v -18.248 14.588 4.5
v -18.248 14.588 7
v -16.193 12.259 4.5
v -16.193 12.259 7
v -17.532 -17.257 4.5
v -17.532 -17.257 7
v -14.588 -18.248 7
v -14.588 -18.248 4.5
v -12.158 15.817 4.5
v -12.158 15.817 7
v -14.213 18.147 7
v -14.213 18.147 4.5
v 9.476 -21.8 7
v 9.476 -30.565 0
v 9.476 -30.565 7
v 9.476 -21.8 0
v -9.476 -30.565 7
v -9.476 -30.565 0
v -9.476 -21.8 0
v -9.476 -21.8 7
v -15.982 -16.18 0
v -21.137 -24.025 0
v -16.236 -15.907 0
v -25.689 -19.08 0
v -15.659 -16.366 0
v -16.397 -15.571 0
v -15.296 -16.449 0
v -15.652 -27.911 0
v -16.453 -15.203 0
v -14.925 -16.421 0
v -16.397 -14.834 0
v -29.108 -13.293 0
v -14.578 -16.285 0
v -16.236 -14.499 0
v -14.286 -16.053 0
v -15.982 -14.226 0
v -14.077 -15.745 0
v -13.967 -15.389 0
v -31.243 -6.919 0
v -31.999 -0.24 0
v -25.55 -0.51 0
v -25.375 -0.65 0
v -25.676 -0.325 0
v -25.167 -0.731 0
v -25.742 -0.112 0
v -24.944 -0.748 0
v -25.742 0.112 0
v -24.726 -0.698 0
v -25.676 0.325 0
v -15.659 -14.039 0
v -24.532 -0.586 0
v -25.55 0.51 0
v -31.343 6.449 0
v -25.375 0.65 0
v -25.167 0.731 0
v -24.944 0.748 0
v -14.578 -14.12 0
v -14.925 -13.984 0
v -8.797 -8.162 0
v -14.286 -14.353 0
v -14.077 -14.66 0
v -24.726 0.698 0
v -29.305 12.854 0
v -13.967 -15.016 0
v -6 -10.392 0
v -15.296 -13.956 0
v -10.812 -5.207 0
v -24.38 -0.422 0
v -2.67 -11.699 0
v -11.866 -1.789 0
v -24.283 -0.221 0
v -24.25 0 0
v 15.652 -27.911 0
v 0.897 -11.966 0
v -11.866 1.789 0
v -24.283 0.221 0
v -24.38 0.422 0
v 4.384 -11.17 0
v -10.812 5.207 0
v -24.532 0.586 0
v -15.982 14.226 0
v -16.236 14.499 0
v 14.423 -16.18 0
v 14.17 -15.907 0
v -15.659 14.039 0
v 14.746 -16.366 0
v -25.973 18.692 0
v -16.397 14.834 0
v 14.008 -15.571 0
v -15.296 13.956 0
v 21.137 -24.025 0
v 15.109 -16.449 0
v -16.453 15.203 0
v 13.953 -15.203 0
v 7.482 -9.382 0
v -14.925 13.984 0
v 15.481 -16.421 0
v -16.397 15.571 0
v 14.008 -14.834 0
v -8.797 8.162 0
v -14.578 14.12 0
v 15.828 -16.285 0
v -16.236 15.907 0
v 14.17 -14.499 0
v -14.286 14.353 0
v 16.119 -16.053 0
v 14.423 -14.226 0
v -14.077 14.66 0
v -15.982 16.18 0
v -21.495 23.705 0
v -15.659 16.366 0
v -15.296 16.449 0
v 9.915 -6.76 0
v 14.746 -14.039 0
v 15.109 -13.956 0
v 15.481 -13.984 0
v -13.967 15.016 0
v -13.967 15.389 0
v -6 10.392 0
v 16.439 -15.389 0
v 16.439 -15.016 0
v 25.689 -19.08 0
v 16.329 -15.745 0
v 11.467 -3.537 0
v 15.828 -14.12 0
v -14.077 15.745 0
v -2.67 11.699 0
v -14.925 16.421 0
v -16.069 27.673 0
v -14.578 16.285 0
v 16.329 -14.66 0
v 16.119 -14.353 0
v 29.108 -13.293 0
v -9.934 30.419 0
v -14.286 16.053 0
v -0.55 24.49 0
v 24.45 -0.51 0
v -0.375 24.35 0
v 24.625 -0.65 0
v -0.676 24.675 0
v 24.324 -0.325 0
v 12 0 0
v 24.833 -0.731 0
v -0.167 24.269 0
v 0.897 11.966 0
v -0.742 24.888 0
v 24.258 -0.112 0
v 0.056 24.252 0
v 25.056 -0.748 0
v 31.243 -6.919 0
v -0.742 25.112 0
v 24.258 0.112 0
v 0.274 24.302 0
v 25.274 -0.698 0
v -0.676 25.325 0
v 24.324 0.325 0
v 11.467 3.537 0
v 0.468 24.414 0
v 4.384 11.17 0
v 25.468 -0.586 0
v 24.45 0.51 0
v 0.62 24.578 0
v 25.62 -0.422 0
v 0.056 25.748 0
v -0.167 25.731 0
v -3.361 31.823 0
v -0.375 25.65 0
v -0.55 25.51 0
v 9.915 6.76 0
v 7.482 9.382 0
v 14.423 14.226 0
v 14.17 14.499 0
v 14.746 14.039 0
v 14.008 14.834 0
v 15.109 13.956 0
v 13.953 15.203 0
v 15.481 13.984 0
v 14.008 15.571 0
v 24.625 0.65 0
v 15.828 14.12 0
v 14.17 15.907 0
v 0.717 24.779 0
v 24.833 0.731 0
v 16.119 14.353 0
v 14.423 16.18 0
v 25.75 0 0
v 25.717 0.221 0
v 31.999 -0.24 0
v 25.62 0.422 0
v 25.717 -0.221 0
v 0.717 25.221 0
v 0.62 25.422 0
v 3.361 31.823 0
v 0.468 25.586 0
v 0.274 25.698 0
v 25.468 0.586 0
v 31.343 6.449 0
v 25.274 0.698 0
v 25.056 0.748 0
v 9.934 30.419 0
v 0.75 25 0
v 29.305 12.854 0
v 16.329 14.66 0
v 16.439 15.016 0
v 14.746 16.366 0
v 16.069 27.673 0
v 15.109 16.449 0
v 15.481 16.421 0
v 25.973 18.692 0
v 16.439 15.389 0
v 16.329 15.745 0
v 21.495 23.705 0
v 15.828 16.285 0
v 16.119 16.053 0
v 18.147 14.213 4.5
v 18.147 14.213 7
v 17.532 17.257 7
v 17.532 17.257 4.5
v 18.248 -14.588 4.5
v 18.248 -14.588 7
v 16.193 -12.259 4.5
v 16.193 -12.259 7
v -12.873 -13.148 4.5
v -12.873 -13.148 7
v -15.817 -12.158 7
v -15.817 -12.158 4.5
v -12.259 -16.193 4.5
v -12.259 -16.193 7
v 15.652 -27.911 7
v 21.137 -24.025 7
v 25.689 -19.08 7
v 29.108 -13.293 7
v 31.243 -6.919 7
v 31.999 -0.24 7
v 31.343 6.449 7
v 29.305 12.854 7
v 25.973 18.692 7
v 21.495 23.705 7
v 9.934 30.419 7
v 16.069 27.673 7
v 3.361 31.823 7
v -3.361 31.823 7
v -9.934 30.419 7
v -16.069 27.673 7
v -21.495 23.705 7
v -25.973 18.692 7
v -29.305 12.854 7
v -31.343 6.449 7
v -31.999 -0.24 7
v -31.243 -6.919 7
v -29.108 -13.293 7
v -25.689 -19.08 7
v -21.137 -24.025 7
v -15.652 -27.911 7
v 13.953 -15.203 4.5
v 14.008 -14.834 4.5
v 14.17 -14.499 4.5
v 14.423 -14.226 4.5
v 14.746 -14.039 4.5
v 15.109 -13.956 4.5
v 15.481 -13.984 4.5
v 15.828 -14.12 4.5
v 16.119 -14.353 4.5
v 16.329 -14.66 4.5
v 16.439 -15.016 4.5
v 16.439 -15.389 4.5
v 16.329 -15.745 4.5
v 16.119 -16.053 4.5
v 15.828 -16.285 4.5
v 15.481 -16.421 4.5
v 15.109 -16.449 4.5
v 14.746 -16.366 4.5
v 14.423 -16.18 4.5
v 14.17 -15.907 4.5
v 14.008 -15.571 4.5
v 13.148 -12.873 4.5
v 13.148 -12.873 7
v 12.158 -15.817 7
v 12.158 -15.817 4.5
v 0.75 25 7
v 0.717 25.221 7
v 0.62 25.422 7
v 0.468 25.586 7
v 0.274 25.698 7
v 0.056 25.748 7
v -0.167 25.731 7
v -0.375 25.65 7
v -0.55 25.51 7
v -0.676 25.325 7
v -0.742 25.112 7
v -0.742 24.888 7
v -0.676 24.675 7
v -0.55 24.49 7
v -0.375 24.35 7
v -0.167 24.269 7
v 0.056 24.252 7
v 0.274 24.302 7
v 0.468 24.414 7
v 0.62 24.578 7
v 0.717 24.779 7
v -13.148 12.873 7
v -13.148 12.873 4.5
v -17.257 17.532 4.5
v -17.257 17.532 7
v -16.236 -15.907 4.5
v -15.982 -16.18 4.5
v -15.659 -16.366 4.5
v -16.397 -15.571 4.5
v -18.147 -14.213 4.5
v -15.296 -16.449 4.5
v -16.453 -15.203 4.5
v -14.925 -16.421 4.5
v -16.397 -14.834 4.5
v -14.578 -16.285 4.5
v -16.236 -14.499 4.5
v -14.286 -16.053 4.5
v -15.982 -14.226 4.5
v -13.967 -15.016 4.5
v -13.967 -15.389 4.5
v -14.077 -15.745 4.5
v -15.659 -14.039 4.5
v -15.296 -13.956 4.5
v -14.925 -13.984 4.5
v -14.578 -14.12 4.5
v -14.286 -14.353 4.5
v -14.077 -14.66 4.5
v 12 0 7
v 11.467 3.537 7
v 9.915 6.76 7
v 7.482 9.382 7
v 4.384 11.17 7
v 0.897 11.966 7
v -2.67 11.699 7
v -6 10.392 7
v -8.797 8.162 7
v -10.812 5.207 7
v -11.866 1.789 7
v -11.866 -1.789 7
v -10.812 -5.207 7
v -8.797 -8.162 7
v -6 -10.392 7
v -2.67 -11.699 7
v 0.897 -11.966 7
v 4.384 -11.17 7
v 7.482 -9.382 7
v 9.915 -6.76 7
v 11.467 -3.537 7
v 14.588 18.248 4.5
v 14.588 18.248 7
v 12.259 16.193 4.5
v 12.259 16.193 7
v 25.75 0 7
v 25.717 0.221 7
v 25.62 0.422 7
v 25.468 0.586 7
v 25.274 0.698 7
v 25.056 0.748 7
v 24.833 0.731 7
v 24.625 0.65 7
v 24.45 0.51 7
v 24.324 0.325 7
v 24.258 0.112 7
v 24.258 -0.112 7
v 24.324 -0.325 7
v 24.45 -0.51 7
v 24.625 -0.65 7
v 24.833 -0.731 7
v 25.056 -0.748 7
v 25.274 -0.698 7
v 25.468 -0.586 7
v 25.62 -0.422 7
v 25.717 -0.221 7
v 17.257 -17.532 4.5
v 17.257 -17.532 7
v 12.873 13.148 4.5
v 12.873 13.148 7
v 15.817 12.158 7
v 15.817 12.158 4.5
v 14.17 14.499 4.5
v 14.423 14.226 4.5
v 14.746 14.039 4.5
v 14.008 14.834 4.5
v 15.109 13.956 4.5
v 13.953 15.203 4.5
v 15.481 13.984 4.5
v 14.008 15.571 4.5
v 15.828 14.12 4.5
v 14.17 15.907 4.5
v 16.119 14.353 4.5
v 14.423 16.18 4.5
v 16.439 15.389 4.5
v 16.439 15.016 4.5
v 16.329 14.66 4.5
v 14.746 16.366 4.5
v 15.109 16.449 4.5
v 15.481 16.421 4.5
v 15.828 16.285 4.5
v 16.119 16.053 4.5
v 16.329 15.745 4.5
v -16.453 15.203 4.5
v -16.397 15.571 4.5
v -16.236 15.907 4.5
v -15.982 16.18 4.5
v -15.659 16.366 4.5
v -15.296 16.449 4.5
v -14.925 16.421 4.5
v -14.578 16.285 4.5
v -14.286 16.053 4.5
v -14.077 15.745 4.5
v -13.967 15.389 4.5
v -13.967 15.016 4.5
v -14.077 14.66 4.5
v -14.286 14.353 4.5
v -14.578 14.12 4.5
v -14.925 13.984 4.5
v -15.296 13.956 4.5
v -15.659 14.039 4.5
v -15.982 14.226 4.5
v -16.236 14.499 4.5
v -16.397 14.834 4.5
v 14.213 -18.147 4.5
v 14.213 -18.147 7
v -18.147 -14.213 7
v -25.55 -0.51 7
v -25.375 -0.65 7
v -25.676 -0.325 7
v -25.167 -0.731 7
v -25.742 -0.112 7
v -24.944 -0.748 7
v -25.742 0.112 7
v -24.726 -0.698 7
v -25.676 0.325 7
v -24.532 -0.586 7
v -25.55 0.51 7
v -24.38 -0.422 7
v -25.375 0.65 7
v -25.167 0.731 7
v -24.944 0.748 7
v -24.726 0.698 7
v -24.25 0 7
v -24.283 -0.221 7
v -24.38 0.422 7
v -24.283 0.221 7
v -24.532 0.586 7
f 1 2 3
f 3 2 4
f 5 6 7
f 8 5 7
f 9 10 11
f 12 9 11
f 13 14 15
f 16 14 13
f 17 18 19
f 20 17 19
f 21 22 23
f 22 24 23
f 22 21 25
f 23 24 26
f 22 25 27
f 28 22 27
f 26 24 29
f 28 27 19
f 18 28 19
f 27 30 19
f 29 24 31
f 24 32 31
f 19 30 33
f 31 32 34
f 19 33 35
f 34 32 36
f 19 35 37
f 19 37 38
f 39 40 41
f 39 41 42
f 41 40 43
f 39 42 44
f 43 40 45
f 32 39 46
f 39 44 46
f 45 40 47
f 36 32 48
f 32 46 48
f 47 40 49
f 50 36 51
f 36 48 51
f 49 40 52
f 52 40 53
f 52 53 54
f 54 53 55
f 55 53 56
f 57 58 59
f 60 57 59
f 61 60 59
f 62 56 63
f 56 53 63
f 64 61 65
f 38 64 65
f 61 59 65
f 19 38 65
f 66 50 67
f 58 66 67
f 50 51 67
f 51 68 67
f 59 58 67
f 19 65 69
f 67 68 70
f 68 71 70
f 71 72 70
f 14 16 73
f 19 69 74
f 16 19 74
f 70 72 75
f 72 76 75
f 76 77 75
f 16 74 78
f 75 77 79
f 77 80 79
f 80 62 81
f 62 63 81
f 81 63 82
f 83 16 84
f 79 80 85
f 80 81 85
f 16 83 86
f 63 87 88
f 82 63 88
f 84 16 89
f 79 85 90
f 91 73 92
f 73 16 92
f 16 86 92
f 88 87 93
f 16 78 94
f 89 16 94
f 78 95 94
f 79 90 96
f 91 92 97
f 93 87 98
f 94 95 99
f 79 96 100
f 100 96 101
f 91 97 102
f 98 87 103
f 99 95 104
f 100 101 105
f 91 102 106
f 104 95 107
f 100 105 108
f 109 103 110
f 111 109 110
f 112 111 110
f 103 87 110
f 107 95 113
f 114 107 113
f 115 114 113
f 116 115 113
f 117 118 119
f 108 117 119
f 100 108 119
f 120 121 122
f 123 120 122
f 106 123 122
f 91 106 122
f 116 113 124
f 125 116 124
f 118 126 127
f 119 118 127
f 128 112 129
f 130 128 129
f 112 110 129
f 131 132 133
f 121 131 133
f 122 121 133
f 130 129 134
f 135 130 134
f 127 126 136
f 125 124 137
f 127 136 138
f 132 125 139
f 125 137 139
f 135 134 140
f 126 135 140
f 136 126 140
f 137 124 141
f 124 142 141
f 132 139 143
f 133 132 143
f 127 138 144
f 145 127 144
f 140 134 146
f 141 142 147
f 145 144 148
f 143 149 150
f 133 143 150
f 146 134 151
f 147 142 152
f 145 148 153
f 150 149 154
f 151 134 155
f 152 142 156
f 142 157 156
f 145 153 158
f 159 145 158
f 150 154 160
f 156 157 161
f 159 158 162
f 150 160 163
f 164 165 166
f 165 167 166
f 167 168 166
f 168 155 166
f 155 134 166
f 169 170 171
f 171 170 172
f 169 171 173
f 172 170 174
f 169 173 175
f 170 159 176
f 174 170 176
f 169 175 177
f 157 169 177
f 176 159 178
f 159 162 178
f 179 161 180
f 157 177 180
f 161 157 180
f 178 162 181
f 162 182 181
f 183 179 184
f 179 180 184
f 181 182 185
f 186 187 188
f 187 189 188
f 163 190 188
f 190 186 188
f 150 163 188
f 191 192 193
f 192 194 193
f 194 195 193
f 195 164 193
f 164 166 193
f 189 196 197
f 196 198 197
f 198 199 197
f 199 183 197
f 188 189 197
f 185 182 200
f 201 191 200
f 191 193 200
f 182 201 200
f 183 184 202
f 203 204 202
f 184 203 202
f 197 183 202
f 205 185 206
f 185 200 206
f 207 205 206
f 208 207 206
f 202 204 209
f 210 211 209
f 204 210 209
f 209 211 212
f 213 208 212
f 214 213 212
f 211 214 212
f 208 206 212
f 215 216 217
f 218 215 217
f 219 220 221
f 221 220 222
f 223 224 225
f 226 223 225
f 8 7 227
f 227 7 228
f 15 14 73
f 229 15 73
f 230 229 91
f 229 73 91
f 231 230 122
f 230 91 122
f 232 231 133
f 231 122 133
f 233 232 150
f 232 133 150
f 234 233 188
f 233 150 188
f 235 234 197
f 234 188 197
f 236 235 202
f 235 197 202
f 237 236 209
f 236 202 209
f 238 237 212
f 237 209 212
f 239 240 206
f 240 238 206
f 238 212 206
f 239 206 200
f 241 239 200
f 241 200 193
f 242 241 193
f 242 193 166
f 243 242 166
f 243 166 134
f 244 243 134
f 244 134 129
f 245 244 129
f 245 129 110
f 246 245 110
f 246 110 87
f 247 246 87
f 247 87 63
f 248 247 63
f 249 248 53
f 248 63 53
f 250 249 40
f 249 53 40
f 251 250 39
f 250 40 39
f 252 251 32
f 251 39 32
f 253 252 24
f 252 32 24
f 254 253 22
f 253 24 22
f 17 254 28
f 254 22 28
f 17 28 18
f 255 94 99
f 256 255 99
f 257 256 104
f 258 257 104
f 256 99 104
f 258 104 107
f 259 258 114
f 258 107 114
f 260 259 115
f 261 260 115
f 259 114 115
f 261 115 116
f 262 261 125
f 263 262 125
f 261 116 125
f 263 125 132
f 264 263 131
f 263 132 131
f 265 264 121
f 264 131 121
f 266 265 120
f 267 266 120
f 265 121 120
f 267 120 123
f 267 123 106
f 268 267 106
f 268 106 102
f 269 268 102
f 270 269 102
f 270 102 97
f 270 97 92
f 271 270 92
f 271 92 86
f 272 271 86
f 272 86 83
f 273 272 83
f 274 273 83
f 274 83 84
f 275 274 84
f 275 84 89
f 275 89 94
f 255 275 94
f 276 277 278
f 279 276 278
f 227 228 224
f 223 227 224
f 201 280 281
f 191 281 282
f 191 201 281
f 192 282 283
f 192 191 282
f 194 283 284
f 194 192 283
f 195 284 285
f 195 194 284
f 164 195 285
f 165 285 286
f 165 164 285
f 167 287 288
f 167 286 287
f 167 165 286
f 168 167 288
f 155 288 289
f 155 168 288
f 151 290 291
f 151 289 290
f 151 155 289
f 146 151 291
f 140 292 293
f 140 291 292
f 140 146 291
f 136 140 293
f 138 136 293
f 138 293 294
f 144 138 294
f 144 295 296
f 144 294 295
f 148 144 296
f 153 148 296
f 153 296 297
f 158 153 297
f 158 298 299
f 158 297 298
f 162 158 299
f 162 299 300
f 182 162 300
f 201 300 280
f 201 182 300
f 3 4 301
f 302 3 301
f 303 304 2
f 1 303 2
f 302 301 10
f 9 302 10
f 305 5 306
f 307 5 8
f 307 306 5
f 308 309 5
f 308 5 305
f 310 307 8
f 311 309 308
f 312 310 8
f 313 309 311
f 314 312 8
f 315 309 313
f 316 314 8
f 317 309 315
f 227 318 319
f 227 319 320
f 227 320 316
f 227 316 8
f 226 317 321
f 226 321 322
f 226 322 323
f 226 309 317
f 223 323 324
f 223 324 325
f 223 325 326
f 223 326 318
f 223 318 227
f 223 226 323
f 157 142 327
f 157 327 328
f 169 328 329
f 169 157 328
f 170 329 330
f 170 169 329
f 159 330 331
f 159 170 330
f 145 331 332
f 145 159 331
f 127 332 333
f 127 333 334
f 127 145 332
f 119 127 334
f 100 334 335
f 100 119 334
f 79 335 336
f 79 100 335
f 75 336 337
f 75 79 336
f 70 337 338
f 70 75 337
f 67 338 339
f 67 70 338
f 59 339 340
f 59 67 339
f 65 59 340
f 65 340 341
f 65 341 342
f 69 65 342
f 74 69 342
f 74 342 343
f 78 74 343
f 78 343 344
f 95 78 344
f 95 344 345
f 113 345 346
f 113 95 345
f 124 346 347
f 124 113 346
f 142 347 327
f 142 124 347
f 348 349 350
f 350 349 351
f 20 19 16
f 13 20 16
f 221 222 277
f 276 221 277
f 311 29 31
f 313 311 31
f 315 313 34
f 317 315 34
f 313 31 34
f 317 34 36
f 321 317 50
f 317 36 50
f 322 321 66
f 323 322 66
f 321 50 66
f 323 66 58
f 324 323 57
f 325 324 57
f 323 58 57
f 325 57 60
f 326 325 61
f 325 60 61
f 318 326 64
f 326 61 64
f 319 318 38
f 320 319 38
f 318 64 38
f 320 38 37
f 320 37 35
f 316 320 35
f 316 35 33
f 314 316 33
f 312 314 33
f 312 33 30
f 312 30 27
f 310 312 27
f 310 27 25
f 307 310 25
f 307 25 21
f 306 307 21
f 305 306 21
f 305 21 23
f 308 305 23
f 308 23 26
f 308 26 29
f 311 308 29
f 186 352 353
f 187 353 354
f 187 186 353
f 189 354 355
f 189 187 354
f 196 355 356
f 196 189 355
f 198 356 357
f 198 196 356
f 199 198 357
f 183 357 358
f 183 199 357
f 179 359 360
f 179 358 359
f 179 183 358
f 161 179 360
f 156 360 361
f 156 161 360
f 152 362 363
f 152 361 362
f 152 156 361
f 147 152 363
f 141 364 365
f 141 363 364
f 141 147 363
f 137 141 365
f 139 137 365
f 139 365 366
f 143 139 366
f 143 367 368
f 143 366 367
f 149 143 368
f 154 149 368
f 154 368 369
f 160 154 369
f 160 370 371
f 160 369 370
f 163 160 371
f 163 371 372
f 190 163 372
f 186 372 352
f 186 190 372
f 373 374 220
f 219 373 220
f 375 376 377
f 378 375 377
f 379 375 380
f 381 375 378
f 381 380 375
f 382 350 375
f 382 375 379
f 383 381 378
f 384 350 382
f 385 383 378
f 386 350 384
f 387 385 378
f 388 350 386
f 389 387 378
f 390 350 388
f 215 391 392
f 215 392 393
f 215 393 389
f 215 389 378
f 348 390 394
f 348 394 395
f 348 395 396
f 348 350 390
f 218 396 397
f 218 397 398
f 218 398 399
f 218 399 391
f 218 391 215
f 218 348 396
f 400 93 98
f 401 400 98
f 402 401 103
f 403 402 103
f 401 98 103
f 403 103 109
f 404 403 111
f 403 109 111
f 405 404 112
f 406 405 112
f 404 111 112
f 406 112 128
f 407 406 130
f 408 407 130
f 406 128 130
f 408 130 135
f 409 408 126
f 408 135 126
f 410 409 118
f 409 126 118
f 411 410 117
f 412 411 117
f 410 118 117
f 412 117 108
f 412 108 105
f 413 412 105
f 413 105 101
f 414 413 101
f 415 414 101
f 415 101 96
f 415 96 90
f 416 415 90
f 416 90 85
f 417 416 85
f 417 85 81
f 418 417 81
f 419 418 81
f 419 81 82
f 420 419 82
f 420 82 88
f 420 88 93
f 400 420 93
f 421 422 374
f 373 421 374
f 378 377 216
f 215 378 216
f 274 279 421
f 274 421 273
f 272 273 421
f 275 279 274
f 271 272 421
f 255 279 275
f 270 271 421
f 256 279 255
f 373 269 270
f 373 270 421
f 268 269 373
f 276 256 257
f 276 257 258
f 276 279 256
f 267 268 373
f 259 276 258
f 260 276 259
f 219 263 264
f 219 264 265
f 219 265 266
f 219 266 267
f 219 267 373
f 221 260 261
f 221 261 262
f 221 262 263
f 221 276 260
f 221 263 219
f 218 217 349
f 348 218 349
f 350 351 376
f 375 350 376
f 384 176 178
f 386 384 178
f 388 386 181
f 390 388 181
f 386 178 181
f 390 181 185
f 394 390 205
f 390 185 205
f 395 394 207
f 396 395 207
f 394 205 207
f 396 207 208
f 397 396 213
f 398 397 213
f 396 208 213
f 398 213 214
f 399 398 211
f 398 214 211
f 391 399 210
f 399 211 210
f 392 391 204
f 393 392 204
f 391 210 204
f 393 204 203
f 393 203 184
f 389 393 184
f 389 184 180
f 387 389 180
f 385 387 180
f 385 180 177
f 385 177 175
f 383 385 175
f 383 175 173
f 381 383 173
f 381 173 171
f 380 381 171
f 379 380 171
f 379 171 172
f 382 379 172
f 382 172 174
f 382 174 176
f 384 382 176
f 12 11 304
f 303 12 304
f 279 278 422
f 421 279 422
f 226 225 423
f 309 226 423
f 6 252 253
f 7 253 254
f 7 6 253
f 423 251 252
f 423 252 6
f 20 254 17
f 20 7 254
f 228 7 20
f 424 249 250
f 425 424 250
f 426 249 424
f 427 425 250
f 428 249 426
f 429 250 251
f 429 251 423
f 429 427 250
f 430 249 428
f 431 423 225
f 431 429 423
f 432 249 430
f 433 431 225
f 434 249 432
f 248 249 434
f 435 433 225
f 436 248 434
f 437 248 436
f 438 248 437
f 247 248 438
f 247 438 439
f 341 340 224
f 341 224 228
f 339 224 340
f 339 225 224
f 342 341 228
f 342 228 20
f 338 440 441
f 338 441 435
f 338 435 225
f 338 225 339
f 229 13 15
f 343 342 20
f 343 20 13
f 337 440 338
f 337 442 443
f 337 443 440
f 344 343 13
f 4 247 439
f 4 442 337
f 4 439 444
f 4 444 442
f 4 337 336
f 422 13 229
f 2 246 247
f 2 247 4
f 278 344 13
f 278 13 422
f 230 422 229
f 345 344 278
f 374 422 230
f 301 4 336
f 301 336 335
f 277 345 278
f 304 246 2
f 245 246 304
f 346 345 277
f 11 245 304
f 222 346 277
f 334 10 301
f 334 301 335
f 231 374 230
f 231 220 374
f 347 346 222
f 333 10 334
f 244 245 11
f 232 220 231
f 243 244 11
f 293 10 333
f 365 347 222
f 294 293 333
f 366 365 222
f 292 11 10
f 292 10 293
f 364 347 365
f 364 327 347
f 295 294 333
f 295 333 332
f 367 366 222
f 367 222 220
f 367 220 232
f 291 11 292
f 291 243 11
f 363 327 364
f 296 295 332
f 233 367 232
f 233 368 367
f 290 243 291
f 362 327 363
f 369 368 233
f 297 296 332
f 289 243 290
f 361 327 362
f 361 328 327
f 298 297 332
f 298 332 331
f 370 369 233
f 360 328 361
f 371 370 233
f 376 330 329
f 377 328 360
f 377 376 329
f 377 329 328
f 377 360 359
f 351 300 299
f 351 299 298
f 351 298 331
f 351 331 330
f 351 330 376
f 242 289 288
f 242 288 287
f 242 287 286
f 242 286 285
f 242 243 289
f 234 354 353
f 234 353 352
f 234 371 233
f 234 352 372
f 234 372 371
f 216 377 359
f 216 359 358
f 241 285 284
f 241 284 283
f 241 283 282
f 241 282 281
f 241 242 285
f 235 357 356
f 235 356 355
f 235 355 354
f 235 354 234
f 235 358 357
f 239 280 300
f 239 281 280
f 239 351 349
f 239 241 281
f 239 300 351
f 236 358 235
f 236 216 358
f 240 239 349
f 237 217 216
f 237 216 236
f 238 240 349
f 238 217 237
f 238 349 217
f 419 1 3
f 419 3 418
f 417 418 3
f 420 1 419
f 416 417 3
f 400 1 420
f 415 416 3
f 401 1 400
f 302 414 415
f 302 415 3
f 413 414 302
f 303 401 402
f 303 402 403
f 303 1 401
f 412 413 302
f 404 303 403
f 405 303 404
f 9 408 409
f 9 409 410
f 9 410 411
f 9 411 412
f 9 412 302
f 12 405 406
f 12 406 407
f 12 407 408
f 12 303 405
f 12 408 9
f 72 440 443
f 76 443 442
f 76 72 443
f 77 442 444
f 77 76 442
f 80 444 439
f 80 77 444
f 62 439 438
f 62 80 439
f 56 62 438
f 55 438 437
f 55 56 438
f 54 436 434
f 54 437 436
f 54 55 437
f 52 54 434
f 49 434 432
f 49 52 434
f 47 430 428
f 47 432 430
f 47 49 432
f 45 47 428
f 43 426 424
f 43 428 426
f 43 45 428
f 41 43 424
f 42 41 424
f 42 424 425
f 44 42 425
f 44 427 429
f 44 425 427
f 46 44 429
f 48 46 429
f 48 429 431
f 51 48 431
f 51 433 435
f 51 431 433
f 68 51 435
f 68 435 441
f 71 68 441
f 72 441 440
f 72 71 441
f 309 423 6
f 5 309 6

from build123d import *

# Parameters (mm, degrees)
F0_R     = 32
F0_R_2   = 12
F1_DEPTH = 7
F3_D     = 2.5
F4_DEPTH = 2.5
F5_R     = 0.75
F6_DEPTH = 25
F7_W     = 18.952996
F7_H     = 20.40381
F8_DEPTH = 25


with BuildPart() as f1:
    # F0 (on Top) → F1 (new body)
    with BuildSketch(Plane.XY):
        Circle(F0_R)
        Circle(F0_R_2, mode=Mode.SUBTRACT)
    extrude(amount=F1_DEPTH)

    # F3 (through all)
    with Locations(Plane.XY.offset(7)):
        with Locations((-15.202796, 15.202796), (15.202796, 15.202796), (15.202796, -15.202796), (-15.202796, -15.202796)):
            Hole(F3_D / 2)

    # F2 (on face) → F4 (cut)
    with BuildSketch(Plane.XY.offset(7)):
        Polygon((-12.158075, 15.817457), (-14.212748, 18.146932), (-17.257468, 17.532271), (-18.247517, 14.588135), (-16.192844, 12.25866), (-13.148123, 12.873321), align=None)
        Polygon((12.25866, 16.192844), (12.873321, 13.148123), (15.817457, 12.158075), (18.146932, 14.212748), (17.532271, 17.257468), (14.588135, 18.247517), align=None)
        Polygon((16.192844, -12.25866), (13.148123, -12.873321), (12.158075, -15.817457), (14.212748, -18.146932), (17.257468, -17.532271), (18.247517, -14.588135), align=None)
        Polygon((-12.25866, -16.192844), (-12.873321, -13.148123), (-15.817457, -12.158075), (-18.146932, -14.212748), (-17.532271, -17.257468), (-14.588135, -18.247517), align=None)
    extrude(amount=-F4_DEPTH, mode=Mode.SUBTRACT)

    # F5 (on Top) → F6 (cut)
    with BuildSketch(Plane.XY):
        with Locations((-25, 0)):
            Circle(F5_R)
        with Locations((0, -25)):
            Circle(F5_R)
        with Locations((25, 0)):
            Circle(F5_R)
        with Locations((0, 25)):
            Circle(F5_R)
    extrude(amount=F6_DEPTH, mode=Mode.SUBTRACT)

    # F7 (on Top) → F8 (cut)
    with BuildSketch(Plane.XY):
        with Locations((0, -32.00157)):
            Rectangle(F7_W, F7_H)
    extrude(amount=F8_DEPTH, mode=Mode.SUBTRACT)


solid = f1.part
